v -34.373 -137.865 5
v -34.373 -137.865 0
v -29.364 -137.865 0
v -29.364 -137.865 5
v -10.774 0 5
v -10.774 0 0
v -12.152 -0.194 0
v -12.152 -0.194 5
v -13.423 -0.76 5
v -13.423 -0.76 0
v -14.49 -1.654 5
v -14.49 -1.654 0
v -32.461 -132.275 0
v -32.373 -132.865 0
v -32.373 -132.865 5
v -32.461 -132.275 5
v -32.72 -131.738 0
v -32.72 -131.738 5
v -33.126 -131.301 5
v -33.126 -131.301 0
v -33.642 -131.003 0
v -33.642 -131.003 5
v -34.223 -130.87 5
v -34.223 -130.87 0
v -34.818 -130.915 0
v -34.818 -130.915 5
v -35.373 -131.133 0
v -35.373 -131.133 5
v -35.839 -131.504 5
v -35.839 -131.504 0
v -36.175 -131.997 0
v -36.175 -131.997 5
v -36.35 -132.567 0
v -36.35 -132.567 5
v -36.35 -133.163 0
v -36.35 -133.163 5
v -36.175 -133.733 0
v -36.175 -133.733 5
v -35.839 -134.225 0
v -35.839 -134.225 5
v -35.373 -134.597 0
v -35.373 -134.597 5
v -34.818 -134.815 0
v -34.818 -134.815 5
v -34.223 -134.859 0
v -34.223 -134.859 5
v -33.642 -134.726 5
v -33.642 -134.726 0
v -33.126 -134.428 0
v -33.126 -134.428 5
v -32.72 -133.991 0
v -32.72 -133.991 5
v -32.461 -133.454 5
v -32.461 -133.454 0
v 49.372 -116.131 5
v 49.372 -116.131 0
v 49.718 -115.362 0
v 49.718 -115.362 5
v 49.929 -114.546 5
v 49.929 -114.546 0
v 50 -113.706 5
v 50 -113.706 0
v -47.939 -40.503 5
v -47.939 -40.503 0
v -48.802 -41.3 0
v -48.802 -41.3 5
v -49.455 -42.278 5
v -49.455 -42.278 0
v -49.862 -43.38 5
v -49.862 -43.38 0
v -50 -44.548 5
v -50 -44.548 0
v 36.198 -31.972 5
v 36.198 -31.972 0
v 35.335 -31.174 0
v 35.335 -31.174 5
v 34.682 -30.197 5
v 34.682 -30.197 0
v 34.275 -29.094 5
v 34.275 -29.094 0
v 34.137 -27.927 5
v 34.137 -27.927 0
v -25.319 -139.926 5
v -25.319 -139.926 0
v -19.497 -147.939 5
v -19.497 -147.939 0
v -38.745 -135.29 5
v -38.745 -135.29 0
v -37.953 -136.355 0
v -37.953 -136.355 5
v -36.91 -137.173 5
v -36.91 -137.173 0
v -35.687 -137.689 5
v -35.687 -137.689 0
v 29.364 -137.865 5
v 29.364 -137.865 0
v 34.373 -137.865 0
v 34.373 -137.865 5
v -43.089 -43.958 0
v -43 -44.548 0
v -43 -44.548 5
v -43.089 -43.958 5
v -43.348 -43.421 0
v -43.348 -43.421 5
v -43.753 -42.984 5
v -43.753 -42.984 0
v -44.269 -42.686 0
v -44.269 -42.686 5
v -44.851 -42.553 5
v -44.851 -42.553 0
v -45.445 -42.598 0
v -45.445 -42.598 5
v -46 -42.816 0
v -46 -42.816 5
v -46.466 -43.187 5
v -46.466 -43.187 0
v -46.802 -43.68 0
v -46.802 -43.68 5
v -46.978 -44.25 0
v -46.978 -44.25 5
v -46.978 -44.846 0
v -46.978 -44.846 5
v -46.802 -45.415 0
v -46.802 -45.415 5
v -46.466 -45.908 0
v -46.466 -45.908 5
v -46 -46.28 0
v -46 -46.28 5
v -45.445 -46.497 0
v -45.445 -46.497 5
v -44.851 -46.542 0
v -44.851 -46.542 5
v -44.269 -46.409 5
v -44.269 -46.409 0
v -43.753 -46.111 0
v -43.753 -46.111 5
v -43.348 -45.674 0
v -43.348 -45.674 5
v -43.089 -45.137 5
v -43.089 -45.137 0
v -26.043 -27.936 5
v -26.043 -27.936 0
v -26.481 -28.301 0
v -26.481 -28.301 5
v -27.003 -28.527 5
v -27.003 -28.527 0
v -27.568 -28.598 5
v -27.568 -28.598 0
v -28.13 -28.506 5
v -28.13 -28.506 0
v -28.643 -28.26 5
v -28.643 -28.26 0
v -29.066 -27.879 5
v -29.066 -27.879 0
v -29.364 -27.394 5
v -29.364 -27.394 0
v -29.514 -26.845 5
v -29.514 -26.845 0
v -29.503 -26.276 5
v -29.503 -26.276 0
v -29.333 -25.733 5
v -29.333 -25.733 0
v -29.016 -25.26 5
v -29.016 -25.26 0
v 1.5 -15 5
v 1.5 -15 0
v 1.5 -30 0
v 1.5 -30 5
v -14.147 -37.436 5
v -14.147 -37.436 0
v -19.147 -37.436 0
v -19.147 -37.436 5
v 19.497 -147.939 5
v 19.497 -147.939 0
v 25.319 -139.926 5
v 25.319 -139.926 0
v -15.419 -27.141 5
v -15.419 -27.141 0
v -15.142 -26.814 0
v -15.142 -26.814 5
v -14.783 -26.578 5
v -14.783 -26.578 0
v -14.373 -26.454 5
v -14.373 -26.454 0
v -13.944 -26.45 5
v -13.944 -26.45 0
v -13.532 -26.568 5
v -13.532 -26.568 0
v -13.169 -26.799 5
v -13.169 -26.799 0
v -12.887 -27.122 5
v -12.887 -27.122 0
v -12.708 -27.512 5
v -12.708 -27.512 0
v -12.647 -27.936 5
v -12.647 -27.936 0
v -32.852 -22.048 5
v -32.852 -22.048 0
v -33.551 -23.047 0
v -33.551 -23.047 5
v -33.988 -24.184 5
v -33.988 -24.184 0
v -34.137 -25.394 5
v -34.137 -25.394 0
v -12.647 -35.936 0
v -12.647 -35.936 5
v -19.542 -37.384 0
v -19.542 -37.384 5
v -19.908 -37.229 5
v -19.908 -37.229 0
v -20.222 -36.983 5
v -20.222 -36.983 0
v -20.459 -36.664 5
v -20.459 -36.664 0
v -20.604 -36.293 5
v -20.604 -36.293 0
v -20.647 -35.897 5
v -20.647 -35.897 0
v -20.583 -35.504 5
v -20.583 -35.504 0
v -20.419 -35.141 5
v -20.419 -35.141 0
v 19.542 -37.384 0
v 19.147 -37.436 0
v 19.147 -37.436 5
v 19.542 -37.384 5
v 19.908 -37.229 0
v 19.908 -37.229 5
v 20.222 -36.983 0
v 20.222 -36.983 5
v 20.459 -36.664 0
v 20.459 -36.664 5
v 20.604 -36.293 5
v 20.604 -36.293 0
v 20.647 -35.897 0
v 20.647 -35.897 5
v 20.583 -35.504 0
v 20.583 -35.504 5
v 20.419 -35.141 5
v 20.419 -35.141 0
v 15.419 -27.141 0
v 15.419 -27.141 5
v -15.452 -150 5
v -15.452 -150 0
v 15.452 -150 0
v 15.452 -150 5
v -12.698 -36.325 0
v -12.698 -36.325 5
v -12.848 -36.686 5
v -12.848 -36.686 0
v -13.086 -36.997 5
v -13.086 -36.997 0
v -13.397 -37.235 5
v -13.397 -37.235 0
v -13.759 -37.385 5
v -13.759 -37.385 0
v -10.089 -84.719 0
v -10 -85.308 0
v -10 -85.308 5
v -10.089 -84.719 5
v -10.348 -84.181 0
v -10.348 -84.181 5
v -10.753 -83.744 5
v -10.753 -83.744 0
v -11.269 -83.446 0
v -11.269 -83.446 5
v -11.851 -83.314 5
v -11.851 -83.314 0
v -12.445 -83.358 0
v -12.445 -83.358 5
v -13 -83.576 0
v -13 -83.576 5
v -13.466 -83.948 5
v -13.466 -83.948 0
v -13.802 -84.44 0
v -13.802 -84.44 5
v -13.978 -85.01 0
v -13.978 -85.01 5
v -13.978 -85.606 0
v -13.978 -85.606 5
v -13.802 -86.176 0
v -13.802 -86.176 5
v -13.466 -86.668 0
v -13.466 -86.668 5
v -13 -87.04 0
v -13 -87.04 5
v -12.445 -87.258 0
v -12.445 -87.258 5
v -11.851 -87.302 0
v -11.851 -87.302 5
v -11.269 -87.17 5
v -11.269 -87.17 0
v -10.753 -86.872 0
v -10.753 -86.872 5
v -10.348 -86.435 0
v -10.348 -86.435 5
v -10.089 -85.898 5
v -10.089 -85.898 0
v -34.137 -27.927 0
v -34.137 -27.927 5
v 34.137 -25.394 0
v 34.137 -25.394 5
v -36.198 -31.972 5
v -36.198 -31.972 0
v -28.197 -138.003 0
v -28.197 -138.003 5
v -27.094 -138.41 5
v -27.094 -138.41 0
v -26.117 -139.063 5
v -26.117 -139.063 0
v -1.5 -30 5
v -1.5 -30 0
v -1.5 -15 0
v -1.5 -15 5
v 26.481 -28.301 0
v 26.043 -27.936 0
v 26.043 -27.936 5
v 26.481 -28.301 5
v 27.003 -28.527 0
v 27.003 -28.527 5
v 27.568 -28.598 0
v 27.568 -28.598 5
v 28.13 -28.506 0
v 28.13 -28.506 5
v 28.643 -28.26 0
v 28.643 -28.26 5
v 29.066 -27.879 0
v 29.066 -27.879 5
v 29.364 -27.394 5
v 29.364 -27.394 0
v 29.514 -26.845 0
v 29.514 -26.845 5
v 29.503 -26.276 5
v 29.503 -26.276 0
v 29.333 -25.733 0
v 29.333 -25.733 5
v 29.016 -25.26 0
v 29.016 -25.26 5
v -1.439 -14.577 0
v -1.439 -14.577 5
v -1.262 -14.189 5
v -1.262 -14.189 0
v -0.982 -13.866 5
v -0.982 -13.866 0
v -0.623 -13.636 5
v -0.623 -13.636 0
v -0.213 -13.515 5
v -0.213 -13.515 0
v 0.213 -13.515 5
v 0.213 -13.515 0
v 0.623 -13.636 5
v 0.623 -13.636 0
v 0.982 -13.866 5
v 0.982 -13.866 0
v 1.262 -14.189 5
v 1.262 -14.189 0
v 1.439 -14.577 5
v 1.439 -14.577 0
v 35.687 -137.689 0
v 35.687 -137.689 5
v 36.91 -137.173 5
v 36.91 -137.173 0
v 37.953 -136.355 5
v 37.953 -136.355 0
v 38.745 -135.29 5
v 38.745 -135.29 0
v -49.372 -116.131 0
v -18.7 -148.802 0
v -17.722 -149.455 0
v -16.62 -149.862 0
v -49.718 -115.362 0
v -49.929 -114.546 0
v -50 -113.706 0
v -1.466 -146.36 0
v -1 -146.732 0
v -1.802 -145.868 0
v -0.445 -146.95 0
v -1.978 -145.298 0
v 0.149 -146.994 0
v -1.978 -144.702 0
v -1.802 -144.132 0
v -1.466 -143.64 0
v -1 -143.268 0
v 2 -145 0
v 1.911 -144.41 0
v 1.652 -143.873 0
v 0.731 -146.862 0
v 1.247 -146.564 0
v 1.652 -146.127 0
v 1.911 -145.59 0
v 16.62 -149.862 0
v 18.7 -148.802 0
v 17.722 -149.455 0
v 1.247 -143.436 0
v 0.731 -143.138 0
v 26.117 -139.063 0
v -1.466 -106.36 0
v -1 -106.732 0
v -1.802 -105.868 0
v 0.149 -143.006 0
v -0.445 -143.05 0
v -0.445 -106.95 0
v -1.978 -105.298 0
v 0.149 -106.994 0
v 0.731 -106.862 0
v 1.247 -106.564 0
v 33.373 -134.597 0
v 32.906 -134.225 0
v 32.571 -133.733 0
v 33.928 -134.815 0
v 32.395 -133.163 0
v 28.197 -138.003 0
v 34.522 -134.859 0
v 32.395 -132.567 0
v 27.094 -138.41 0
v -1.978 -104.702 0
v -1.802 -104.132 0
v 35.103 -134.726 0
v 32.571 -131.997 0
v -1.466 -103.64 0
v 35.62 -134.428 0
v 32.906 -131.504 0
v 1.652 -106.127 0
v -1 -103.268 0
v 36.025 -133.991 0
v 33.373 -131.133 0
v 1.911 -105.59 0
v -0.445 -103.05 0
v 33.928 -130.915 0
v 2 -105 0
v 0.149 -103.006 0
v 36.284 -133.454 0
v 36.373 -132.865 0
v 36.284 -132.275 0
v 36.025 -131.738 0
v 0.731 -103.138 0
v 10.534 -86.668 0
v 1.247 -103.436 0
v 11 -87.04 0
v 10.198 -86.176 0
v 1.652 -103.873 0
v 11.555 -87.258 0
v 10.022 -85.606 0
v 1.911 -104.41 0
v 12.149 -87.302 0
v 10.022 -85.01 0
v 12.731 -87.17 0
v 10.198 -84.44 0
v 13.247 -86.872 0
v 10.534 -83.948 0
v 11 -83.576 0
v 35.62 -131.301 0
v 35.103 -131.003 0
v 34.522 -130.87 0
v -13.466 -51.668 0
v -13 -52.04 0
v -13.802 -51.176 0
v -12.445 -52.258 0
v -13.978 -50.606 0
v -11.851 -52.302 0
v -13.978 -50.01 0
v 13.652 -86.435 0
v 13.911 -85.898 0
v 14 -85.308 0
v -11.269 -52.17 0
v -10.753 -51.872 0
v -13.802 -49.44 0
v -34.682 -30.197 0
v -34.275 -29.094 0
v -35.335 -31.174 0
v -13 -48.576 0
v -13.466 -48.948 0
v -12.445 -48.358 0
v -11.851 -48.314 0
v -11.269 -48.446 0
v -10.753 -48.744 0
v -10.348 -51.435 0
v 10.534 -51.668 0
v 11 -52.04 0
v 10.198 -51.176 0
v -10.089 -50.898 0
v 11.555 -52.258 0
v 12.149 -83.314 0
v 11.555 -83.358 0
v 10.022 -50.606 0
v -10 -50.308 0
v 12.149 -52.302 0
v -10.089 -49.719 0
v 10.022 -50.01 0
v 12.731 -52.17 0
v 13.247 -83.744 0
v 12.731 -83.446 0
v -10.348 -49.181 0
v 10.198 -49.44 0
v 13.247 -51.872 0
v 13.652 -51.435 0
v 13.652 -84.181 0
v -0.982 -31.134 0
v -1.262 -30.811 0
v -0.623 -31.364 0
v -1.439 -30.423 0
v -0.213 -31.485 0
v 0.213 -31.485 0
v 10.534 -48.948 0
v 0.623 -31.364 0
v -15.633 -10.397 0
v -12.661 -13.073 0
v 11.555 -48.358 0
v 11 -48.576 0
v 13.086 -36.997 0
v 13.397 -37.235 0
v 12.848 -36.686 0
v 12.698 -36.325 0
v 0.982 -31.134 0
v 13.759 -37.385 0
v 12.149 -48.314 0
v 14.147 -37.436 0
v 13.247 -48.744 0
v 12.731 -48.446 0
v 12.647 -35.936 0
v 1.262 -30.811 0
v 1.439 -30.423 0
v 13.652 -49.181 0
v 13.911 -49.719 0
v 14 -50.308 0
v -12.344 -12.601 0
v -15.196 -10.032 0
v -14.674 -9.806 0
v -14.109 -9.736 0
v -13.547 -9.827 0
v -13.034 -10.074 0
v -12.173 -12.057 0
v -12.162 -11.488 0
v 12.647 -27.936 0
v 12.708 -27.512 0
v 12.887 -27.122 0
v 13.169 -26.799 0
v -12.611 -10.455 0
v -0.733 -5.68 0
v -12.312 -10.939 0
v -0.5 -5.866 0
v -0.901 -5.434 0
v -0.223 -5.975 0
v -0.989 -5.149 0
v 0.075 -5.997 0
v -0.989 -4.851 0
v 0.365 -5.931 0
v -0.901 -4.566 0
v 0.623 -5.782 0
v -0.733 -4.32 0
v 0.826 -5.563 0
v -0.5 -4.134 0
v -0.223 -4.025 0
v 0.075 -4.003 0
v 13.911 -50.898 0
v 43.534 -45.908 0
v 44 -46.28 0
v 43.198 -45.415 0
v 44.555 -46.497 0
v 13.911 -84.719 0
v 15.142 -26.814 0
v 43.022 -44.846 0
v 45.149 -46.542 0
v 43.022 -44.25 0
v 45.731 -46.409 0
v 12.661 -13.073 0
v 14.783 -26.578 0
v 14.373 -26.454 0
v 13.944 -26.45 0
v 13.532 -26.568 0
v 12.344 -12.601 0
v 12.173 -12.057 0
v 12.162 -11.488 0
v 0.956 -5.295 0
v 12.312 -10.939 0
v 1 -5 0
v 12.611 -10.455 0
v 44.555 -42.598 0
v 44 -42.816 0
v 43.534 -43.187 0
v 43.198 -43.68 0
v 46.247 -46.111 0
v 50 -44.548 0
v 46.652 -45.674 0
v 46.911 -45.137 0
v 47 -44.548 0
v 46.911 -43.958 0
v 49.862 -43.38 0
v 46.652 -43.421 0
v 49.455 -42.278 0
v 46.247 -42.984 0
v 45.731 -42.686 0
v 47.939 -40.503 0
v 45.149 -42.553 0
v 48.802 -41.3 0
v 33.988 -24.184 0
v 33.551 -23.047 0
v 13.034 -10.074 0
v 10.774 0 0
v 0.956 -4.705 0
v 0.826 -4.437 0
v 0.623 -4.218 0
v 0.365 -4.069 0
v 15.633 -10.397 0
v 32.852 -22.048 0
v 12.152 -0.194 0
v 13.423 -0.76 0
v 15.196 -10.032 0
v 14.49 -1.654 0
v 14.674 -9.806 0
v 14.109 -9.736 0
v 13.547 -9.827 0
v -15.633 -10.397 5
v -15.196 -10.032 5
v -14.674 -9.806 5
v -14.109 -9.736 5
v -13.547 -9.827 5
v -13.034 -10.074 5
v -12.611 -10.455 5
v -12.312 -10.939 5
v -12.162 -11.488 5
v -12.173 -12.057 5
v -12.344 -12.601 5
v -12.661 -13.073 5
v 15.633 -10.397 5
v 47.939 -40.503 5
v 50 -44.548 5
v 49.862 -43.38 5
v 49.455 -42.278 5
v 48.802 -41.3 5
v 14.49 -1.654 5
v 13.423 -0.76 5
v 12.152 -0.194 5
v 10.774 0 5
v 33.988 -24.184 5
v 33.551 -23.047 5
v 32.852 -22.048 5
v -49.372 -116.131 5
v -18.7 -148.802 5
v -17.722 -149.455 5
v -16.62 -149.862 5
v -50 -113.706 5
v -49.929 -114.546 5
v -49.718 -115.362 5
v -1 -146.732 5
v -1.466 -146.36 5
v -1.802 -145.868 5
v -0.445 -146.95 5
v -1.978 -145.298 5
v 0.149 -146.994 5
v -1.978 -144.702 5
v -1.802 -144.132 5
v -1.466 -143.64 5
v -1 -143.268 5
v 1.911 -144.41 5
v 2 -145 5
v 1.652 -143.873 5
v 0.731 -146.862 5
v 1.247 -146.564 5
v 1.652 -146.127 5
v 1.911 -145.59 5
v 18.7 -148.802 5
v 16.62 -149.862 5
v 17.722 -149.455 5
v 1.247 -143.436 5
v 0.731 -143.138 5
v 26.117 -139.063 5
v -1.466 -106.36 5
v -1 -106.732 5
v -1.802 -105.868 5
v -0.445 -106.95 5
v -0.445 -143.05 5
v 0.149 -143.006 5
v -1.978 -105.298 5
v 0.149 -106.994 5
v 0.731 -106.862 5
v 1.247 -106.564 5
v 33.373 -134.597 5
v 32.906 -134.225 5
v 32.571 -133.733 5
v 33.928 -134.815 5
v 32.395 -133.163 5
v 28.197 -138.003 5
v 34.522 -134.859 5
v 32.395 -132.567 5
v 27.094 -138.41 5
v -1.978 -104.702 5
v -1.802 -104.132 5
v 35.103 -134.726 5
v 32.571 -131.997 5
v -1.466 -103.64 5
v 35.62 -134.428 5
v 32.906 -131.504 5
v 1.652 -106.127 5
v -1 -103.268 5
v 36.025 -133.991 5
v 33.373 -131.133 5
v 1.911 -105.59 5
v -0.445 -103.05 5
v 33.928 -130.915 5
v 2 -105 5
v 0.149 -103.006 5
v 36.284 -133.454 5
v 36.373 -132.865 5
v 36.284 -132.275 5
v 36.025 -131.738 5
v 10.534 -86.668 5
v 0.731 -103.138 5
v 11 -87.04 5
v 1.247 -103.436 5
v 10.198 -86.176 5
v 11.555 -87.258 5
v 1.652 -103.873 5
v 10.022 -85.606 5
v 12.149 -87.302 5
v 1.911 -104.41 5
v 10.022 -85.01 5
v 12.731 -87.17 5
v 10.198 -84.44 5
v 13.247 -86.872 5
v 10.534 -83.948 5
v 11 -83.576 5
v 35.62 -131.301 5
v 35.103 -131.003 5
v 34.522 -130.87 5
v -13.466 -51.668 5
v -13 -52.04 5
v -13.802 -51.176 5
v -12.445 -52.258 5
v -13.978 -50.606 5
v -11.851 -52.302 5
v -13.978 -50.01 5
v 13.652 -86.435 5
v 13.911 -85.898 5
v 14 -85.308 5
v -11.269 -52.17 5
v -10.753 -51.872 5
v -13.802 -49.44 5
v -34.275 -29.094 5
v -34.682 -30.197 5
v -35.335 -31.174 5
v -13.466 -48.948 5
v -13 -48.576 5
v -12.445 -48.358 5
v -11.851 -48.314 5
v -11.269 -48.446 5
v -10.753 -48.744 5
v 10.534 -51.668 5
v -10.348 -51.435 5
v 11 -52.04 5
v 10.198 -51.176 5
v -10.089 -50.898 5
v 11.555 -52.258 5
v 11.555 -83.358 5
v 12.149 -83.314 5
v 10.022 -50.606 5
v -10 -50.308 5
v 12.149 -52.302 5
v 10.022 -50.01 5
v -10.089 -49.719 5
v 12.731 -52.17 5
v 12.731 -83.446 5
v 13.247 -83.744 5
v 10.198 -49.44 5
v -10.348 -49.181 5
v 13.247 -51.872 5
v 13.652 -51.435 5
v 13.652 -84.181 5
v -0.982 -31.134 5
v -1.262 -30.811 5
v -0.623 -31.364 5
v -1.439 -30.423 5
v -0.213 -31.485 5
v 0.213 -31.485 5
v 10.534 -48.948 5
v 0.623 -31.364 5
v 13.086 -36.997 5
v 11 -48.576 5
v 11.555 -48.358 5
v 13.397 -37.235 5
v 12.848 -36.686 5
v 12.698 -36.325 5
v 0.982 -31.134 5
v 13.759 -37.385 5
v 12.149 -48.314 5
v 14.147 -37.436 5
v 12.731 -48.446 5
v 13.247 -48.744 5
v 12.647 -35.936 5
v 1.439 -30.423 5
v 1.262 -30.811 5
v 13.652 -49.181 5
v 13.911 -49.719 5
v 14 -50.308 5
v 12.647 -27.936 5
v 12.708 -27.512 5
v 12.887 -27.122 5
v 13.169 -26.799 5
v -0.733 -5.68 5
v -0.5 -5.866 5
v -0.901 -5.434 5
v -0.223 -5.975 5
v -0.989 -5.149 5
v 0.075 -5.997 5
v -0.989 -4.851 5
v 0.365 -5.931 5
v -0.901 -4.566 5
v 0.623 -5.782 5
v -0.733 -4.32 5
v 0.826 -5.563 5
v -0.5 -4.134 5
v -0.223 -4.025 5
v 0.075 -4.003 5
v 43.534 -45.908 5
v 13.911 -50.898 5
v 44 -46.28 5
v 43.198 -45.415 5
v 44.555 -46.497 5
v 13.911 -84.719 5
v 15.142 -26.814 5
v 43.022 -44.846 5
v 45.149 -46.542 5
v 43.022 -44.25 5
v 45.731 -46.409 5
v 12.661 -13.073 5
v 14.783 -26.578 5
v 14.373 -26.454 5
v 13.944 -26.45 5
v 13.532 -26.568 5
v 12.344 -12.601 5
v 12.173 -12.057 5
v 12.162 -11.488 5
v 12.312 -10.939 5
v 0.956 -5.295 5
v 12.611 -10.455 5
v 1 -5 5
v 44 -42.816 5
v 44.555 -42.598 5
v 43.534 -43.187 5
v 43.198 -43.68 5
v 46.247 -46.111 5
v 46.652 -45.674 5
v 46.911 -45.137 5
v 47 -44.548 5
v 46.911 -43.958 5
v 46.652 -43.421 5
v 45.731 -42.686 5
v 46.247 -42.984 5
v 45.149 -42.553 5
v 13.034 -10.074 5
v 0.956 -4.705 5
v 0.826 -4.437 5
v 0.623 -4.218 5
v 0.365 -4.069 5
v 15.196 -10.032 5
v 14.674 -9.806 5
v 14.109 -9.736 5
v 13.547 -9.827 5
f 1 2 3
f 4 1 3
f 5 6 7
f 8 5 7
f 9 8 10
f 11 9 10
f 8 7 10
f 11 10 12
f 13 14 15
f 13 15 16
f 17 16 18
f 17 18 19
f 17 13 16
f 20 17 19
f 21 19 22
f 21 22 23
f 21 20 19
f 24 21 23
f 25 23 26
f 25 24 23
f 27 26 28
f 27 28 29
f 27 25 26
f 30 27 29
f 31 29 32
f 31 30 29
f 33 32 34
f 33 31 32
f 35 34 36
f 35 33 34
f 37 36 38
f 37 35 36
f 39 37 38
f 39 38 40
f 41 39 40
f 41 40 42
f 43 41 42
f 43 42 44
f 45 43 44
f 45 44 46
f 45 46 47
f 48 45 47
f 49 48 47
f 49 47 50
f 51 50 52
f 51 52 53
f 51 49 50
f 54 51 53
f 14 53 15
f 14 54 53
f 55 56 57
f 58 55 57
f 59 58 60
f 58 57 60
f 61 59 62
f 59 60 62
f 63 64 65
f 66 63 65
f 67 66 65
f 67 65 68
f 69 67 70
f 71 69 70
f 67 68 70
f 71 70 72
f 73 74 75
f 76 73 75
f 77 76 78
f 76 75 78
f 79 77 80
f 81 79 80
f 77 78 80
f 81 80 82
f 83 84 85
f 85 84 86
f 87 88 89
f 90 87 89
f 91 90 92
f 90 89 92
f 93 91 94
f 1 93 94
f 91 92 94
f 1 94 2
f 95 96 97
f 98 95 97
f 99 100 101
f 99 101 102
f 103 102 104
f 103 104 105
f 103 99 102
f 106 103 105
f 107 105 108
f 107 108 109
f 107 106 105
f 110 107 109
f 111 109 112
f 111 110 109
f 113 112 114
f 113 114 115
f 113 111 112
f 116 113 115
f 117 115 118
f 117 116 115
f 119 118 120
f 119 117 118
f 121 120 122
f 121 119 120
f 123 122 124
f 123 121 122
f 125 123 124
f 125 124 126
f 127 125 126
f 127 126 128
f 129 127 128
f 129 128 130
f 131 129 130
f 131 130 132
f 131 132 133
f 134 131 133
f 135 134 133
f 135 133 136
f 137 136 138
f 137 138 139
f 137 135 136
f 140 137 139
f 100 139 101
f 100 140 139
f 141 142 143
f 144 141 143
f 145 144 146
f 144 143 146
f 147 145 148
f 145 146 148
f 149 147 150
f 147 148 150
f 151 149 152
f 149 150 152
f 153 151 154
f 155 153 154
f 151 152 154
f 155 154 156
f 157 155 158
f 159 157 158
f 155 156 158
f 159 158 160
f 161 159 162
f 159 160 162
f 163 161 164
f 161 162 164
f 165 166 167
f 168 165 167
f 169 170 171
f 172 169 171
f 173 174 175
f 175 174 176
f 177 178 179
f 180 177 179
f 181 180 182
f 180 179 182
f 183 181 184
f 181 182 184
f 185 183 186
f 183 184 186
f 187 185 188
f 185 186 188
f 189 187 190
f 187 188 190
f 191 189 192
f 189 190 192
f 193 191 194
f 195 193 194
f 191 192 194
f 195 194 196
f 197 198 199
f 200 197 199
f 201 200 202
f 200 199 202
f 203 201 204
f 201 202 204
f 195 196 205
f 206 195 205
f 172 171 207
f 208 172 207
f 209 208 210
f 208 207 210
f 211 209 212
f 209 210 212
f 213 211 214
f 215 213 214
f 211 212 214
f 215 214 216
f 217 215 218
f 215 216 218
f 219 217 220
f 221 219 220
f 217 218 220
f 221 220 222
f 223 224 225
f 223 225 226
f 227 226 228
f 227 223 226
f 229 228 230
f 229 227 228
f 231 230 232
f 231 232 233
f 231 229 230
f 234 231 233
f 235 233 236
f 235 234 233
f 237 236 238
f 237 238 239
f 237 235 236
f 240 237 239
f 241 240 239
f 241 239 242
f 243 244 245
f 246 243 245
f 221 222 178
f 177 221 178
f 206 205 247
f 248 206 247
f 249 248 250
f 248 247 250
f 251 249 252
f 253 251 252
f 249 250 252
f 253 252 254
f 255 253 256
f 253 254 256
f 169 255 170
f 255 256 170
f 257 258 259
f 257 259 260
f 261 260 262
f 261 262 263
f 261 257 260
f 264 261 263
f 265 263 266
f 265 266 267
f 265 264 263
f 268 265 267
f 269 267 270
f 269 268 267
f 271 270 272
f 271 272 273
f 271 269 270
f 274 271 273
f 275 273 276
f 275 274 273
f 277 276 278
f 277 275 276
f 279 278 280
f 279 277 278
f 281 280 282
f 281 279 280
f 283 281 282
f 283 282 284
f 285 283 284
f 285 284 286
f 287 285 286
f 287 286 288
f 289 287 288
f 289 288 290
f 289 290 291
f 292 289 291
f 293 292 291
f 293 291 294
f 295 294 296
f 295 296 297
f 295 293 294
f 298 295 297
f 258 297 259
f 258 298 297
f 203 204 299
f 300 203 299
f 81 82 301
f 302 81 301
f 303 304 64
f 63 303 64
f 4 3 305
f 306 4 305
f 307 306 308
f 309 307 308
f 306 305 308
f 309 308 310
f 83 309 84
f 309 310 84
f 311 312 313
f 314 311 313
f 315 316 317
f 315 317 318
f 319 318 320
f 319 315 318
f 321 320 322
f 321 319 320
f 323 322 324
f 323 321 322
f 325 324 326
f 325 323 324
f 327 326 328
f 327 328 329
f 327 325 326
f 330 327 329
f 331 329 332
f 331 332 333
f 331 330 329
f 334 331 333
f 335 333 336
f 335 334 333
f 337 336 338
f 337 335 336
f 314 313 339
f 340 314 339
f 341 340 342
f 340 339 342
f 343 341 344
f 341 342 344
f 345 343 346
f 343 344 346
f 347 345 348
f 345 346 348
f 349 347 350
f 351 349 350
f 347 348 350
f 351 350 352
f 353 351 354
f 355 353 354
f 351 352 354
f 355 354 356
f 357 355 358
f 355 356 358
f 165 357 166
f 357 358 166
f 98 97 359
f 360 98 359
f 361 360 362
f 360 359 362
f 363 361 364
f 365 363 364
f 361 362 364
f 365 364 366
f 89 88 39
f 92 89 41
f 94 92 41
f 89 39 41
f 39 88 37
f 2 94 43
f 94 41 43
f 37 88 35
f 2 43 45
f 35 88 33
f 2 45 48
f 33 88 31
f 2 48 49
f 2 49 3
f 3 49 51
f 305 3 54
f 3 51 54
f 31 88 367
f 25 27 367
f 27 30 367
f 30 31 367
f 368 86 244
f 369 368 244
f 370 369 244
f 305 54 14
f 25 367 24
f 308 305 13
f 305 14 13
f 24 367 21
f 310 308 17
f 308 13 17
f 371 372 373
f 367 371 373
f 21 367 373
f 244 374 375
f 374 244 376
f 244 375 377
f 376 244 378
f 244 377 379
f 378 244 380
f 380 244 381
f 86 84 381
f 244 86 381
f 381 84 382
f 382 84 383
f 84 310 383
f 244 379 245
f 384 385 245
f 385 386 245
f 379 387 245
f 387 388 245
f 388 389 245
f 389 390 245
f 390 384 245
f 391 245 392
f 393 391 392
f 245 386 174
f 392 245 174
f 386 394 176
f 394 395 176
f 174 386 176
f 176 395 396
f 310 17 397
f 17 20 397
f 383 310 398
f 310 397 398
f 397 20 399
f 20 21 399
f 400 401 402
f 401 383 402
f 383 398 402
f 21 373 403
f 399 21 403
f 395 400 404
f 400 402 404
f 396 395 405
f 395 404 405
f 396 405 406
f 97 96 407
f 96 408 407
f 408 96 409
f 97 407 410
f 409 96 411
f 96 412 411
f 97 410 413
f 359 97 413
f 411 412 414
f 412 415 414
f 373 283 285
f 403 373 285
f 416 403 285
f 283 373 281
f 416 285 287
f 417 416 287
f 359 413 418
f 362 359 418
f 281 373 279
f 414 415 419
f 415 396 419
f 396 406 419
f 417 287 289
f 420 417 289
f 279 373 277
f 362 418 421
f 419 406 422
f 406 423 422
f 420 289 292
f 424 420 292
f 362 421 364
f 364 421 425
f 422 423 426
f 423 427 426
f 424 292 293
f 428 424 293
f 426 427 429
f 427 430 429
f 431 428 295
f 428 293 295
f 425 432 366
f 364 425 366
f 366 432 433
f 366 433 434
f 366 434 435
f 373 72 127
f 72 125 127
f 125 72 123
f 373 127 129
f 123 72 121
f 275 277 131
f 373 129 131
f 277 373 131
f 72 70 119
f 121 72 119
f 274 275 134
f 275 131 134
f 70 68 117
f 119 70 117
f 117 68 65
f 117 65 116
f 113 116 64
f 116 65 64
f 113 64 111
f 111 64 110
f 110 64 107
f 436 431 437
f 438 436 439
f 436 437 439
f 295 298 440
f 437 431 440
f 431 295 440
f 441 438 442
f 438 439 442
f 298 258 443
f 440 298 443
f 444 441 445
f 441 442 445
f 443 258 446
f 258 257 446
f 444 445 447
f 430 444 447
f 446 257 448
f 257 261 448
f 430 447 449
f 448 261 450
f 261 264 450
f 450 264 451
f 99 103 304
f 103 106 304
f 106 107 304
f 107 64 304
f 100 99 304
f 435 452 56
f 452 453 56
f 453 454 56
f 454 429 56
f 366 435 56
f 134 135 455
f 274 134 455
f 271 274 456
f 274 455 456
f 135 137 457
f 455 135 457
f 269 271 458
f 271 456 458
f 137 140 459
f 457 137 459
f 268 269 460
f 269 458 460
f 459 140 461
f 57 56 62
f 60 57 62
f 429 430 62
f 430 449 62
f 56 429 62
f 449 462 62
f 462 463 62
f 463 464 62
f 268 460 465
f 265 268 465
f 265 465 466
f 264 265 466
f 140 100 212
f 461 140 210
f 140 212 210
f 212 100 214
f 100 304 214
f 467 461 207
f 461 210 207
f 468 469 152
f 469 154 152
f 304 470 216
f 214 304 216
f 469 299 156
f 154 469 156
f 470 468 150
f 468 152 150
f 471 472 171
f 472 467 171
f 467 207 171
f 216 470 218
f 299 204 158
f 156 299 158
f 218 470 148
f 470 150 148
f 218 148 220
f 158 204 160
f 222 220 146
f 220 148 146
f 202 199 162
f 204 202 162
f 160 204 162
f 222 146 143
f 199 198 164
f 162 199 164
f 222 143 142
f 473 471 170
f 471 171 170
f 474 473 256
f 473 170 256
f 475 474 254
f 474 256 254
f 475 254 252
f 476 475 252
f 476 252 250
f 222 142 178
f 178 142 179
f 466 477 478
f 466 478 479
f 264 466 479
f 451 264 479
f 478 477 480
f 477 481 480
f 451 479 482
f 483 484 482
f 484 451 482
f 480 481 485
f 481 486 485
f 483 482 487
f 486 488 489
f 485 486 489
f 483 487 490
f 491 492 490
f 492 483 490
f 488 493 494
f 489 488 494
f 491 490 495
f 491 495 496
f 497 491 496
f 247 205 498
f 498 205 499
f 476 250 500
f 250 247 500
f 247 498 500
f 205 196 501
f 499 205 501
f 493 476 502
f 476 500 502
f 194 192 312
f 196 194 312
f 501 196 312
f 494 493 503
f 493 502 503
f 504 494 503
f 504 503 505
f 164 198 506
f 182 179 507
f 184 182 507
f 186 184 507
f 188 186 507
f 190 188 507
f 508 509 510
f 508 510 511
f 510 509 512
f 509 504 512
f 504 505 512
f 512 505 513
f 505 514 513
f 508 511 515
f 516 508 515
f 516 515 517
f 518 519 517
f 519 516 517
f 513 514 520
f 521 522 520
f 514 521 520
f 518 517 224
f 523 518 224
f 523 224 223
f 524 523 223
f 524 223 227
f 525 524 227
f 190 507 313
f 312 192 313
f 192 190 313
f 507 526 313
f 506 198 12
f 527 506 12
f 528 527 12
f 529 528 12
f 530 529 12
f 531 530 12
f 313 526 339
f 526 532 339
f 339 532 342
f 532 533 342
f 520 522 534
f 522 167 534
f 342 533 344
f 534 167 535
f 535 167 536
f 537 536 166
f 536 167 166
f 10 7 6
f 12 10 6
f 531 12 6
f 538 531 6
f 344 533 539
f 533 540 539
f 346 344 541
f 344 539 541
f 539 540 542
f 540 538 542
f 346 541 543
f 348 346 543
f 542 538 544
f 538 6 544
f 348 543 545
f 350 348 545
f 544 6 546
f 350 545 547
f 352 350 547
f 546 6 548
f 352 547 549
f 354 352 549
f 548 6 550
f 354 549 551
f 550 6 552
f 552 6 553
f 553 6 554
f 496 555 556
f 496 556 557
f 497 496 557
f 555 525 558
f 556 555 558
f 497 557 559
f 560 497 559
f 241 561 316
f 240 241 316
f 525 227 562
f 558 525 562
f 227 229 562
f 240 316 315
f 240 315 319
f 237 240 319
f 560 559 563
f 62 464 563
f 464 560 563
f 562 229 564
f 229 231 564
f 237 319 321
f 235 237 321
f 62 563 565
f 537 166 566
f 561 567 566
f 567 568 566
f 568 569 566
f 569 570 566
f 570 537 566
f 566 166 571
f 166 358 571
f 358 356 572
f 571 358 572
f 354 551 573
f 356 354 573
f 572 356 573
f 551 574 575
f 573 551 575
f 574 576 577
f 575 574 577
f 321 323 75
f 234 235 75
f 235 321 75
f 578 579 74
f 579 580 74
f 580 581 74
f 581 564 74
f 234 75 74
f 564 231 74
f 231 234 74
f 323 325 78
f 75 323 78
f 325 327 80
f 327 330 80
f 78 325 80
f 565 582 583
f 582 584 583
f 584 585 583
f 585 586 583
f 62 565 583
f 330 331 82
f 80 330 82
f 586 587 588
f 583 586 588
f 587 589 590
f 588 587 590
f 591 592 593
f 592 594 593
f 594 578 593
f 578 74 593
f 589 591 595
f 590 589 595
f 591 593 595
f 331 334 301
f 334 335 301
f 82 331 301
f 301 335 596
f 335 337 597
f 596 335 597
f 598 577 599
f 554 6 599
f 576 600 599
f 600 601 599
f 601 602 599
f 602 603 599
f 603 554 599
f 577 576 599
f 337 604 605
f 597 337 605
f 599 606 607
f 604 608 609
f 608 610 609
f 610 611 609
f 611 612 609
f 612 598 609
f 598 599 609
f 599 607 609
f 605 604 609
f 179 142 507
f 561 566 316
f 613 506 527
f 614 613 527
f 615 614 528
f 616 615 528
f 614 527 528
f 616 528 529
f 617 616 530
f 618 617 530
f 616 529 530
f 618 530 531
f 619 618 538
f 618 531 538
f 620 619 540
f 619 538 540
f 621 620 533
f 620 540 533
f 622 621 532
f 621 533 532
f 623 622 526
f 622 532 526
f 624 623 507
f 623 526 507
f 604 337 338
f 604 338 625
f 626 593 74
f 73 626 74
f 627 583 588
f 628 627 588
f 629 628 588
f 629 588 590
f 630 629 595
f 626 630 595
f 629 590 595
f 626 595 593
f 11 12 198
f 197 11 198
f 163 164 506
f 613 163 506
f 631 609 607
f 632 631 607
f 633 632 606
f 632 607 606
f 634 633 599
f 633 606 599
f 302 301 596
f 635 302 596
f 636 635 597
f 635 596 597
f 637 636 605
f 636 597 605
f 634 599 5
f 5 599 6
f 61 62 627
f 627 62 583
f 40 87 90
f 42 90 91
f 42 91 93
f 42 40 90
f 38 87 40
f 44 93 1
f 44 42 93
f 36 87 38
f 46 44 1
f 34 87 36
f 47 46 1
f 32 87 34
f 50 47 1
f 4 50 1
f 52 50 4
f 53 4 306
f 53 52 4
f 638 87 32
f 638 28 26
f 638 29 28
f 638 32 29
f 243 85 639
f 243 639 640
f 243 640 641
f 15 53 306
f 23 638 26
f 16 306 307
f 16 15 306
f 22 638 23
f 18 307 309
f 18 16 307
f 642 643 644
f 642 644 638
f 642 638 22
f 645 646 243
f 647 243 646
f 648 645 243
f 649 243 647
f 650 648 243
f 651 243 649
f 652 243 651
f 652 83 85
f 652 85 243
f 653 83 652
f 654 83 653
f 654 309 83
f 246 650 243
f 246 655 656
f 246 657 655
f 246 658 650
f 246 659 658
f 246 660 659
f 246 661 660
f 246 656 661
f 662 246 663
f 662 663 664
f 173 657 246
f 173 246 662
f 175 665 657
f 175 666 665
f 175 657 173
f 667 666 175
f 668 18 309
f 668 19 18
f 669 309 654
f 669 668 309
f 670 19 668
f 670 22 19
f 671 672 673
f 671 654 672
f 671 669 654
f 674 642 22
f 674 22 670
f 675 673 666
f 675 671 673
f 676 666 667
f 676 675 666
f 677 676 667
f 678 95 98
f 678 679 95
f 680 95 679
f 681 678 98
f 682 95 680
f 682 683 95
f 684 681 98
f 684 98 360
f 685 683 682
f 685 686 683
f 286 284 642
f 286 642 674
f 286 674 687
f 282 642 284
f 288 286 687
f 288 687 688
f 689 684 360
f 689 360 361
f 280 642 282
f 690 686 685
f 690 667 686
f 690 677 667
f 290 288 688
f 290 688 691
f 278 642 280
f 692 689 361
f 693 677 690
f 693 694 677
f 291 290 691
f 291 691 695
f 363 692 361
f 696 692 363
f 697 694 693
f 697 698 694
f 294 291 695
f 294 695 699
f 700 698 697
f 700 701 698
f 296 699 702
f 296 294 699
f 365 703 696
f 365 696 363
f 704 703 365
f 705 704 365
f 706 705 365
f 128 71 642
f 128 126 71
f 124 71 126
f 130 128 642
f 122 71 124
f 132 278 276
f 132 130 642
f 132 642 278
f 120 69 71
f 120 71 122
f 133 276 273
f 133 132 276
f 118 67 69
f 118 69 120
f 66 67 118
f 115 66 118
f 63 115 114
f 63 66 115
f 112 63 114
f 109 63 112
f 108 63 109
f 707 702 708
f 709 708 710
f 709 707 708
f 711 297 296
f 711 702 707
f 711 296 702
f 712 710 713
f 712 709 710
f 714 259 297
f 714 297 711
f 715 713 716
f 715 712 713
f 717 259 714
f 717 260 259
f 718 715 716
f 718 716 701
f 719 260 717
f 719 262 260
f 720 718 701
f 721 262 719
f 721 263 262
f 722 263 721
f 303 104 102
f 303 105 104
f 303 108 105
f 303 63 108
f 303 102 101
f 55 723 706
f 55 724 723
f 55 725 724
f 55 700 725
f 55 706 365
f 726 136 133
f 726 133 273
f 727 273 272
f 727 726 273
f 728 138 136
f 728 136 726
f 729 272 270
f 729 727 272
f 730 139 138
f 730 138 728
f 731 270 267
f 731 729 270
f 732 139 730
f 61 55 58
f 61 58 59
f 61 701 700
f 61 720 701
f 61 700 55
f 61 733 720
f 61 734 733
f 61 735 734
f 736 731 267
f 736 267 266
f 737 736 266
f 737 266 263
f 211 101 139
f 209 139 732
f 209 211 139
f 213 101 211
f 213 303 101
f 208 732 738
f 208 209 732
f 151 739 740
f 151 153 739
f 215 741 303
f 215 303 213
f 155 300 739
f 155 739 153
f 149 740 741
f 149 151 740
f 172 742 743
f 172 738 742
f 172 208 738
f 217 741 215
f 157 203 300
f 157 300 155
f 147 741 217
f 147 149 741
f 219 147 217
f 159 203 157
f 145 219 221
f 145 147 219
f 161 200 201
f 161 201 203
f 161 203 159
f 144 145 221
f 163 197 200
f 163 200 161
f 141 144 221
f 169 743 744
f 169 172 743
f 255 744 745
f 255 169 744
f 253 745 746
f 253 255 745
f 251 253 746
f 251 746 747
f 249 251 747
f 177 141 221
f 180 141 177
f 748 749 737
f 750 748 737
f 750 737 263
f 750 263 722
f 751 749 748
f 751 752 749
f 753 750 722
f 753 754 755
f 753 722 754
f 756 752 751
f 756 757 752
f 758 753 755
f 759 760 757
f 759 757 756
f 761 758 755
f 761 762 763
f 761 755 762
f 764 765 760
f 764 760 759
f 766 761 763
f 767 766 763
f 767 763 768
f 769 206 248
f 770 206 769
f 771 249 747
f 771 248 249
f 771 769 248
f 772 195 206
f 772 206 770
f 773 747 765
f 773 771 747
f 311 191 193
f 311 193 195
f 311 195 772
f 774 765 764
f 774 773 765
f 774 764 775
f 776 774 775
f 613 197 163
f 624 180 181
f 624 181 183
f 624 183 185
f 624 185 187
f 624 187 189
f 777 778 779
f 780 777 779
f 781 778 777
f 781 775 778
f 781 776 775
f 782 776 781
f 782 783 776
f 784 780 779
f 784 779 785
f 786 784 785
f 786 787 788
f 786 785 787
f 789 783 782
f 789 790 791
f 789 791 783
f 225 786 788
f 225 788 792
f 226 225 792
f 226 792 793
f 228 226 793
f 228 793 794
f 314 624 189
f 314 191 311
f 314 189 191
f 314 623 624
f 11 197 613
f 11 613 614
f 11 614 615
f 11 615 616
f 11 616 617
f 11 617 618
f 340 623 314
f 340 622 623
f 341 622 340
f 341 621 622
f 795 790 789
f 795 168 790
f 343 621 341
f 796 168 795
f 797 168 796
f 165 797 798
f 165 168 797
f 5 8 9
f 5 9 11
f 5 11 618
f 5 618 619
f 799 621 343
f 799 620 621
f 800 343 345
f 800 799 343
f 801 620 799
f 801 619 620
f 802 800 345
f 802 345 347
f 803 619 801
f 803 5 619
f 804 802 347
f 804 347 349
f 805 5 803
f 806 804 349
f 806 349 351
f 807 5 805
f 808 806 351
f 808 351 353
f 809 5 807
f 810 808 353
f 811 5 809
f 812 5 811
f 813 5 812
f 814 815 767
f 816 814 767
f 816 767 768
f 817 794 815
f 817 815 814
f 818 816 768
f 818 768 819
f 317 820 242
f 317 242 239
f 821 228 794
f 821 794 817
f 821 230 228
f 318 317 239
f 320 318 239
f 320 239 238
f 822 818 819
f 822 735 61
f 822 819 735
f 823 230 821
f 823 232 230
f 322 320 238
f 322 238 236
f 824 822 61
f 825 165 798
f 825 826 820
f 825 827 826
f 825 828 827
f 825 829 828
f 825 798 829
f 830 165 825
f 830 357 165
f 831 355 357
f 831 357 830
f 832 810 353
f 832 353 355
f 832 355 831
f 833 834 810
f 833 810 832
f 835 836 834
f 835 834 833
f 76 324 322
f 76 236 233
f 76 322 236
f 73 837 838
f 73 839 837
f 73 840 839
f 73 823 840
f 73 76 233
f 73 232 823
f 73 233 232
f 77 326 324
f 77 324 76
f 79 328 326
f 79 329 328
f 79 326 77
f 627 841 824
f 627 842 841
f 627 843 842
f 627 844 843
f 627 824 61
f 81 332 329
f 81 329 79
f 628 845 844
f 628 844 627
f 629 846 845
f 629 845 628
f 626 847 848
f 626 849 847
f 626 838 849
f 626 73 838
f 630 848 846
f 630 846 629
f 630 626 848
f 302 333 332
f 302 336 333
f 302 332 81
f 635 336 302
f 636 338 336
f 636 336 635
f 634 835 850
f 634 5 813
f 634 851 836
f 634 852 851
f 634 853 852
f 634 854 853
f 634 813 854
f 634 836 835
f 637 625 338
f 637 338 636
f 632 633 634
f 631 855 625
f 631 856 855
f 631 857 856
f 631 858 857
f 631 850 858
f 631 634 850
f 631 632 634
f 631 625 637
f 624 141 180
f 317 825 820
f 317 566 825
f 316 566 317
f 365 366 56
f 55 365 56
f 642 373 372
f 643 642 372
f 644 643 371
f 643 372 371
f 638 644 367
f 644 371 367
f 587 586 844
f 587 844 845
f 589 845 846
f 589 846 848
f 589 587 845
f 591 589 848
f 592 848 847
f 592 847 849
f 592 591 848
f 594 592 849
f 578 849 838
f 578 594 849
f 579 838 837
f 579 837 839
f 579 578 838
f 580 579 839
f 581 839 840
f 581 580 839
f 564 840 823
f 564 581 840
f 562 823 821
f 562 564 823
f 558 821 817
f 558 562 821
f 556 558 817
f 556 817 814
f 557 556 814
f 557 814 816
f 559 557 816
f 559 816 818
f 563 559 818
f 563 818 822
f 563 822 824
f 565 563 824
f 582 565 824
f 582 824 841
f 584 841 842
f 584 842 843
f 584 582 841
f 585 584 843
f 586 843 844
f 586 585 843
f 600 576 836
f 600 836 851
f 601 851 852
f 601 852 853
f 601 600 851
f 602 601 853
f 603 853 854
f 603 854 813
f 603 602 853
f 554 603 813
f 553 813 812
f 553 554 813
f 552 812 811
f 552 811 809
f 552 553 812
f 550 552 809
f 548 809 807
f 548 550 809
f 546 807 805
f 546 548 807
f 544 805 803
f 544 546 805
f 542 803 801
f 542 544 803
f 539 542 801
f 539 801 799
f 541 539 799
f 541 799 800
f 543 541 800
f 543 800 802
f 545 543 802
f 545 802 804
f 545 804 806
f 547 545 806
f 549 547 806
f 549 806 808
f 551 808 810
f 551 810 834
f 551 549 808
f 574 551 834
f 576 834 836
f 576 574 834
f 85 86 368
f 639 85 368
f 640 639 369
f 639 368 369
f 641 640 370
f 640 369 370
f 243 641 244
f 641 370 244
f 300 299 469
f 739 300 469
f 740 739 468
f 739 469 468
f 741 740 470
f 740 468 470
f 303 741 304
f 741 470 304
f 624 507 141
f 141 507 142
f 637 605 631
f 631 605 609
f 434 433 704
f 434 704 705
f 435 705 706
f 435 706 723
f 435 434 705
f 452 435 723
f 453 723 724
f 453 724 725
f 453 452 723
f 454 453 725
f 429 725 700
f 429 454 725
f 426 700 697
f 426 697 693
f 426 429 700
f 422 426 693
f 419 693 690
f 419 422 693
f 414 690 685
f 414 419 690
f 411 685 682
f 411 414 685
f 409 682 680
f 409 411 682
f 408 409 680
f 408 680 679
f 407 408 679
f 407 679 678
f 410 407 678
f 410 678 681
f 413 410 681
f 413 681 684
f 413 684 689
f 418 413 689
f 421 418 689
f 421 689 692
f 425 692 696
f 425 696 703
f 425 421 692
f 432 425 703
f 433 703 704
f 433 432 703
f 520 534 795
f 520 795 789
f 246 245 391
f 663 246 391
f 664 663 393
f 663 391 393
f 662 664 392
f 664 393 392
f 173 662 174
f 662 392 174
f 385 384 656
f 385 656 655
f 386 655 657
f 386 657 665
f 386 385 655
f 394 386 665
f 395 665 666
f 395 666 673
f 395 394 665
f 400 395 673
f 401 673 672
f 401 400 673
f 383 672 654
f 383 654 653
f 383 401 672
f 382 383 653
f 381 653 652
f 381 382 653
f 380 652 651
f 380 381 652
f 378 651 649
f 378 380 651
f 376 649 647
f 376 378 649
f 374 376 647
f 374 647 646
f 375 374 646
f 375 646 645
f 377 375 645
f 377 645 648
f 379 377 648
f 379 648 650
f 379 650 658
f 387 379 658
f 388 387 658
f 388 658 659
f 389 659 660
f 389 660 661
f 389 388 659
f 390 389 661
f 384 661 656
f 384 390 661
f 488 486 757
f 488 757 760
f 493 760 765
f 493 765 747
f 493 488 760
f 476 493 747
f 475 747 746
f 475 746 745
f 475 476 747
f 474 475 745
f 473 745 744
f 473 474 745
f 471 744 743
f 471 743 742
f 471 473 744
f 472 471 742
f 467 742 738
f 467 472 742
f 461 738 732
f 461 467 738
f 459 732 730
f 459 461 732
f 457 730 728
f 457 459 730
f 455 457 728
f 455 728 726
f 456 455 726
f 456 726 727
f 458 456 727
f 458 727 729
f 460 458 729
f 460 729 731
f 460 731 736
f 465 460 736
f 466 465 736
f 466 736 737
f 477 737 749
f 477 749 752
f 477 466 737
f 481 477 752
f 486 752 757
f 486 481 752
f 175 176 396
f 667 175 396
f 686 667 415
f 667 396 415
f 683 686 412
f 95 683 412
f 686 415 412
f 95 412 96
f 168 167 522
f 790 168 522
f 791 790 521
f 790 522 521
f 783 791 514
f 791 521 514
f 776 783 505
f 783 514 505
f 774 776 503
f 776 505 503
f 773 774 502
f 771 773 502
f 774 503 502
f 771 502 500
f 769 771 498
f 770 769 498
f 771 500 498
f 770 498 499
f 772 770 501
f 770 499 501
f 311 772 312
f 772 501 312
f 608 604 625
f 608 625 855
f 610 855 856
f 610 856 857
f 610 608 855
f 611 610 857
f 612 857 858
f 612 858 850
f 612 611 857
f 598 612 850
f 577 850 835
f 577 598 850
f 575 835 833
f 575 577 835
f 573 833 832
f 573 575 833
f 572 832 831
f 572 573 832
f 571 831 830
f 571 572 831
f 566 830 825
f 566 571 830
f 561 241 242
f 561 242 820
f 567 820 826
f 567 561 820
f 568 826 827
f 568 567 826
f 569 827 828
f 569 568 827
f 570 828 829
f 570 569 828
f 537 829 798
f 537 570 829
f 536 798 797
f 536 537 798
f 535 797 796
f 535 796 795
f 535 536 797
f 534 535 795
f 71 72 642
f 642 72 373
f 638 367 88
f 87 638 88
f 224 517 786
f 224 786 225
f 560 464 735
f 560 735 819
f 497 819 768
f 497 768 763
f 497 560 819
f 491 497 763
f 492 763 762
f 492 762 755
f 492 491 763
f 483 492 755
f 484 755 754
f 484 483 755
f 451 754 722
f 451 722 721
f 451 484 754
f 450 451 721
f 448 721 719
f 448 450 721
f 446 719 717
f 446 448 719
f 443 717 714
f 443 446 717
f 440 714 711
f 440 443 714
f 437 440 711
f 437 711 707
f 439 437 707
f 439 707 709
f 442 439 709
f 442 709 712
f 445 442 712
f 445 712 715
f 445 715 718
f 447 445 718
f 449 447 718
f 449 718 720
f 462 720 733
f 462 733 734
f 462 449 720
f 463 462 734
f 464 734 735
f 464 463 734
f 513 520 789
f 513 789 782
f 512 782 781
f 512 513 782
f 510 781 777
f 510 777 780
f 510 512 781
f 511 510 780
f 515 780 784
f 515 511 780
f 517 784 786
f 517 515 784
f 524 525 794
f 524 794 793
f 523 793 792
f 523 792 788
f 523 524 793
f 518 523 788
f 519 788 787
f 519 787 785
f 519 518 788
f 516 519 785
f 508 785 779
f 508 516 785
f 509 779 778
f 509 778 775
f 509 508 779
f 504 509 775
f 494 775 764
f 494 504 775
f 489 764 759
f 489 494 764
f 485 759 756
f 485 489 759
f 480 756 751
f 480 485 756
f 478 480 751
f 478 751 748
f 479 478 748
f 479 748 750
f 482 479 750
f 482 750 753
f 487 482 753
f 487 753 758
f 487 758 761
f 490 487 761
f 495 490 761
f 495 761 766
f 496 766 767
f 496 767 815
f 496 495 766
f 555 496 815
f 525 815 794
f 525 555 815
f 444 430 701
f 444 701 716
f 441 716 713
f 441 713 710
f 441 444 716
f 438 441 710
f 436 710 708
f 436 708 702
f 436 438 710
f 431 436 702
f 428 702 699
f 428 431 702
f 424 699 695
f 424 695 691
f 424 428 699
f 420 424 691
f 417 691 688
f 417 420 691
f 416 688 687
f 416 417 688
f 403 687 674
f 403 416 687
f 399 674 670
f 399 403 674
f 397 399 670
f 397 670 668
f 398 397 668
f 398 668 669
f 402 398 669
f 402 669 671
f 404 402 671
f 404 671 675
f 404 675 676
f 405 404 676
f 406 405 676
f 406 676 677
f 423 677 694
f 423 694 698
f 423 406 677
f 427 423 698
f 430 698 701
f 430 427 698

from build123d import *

# Parameters (mm, degrees)
SKETCH2_R           = 1
SKETCH2_R_2         = 2
BOSS_EXTRUDE1_DEPTH = 5


with BuildPart() as part:
    # Sketch2 → Boss-Extrude1 (new body)
    with BuildSketch(Plane.XY):
        with BuildLine():
            Line((10.773856573, 0), (-10.773856573, 0))
            ThreePointArc((-10.773856573, 0), (-12.807539789, -0.432272712), (-14.489580701, -1.654346968))
            Line((-14.489580701, -1.654346968), (-32.85230533, -22.048218747))
            ThreePointArc((-32.85230533, -22.048218747), (-33.804483335, -23.602032031), (-34.136581202, -25.393871779))
            Line((-34.136581202, -25.393871779), (-34.136581202, -27.926924356))
            ThreePointArc((-34.136581202, -27.926924356), (-34.681548581, -30.196876855), (-36.197654941, -31.972009328))
            Line((-36.197654941, -31.972009328), (-47.938926261, -40.502542276))
            ThreePointArc((-47.938926261, -40.502542276), (-49.455032621, -42.277674749), (-50, -44.547627247))
            Line((-50, -44.547627247), (-50, -113.7061014))
            ThreePointArc((-50, -113.7061014), (-49.840547901, -114.95873703), (-49.372361591, -116.131478508))
            Line((-49.372361591, -116.131478508), (-38.744938669, -135.290122192))
            ThreePointArc((-38.744938669, -135.290122192), (-36.909614174, -137.173276478), (-34.372577077, -137.864745084))
            Line((-34.372577077, -137.864745084), (-29.364406032, -137.864745084))
            ThreePointArc((-29.364406032, -137.864745084), (-27.094453533, -138.409712463), (-25.31932106, -139.925818823))
            Line((-25.31932106, -139.925818823), (-19.497457724, -147.938926261))
            ThreePointArc((-19.497457724, -147.938926261), (-17.722325251, -149.455032621), (-15.452372753, -150))
            Line((-15.452372753, -150), (15.452372753, -150))
            ThreePointArc((15.452372753, -150), (17.722325251, -149.455032621), (19.497457724, -147.938926261))
            Line((19.497457724, -147.938926261), (25.31932106, -139.925818823))
            ThreePointArc((25.31932106, -139.925818823), (27.094453533, -138.409712463), (29.364406032, -137.864745084))
            Line((29.364406032, -137.864745084), (34.372577077, -137.864745084))
            ThreePointArc((34.372577077, -137.864745084), (36.909614174, -137.173276478), (38.744938669, -135.290122192))
            Line((38.744938669, -135.290122192), (49.372361591, -116.131478508))
            ThreePointArc((49.372361591, -116.131478508), (49.840547901, -114.95873703), (50, -113.7061014))
            Line((50, -113.7061014), (50, -44.547627247))
            ThreePointArc((50, -44.547627247), (49.455032621, -42.277674749), (47.938926261, -40.502542276))
            Line((47.938926261, -40.502542276), (36.197654941, -31.972009328))
            ThreePointArc((36.197654941, -31.972009328), (34.681548581, -30.196876855), (34.136581202, -27.926924356))
            Line((34.136581202, -27.926924356), (34.136581202, -25.393871779))
            ThreePointArc((34.136581202, -25.393871779), (33.804483335, -23.602032031), (32.85230533, -22.048218747))
            Line((32.85230533, -22.048218747), (14.489580701, -1.654346968))
            ThreePointArc((14.489580701, -1.654346968), (12.807539789, -0.432272712), (10.773856573, 0))
        make_face()
        with Locations((0, -5)):
            Circle(SKETCH2_R, mode=Mode.SUBTRACT)
        with Locations((0, -145)):
            Circle(SKETCH2_R_2, mode=Mode.SUBTRACT)
        with Locations((0, -105)):
            Circle(SKETCH2_R_2, mode=Mode.SUBTRACT)
        with Locations((-12, -50.308044585)):
            Circle(SKETCH2_R_2, mode=Mode.SUBTRACT)
        with Locations((12, -50.308044585)):
            Circle(SKETCH2_R_2, mode=Mode.SUBTRACT)
        with Locations((12, -85.308044585)):
            Circle(SKETCH2_R_2, mode=Mode.SUBTRACT)
        with Locations((-12, -85.308044585)):
            Circle(SKETCH2_R_2, mode=Mode.SUBTRACT)
        with Locations((-34.372577077, -132.864745084)):
            Circle(SKETCH2_R_2, mode=Mode.SUBTRACT)
        with Locations((34.372577077, -132.864745084)):
            Circle(SKETCH2_R_2, mode=Mode.SUBTRACT)
        with Locations((-45, -44.547627247)):
            Circle(SKETCH2_R_2, mode=Mode.SUBTRACT)
        with Locations((45, -44.547627247)):
            Circle(SKETCH2_R_2, mode=Mode.SUBTRACT)
        with BuildLine():
            Line((-12.660728973, -13.073490301), (-26.043341101, -27.93638681))
            ThreePointArc((-26.043341101, -27.93638681), (-28.867891964, -28.084415248), (-29.015920402, -25.259864385))
            Line((-29.015920402, -25.259864385), (-15.633308275, -10.396967875))
            ThreePointArc((-15.633308275, -10.396967875), (-12.808757412, -10.248939437), (-12.660728973, -13.073490301))
        make_face(mode=Mode.SUBTRACT)
        with BuildLine():
            Line((14.147018624, -37.43638681), (19.147018624, -37.43638681))
            ThreePointArc((19.147018624, -37.43638681), (20.458982346, -36.663539609), (20.41901608, -35.1413884))
            Line((20.41901608, -35.1413884), (15.41901608, -27.1413884))
            ThreePointArc((15.41901608, -27.1413884), (13.733494855, -26.494513691), (12.647018624, -27.93638681))
            Line((12.647018624, -27.93638681), (12.647018624, -35.93638681))
            ThreePointArc((12.647018624, -35.93638681), (13.086358453, -36.997046982), (14.147018624, -37.43638681))
        make_face(mode=Mode.SUBTRACT)
        with BuildLine():
            Line((-14.147018624, -37.43638681), (-19.147018624, -37.43638681))
            ThreePointArc((-19.147018624, -37.43638681), (-20.458982346, -36.663539609), (-20.41901608, -35.1413884))
            Line((-20.41901608, -35.1413884), (-15.41901608, -27.1413884))
            ThreePointArc((-15.41901608, -27.1413884), (-13.733494855, -26.494513691), (-12.647018624, -27.93638681))
            Line((-12.647018624, -27.93638681), (-12.647018624, -35.93638681))
            ThreePointArc((-12.647018624, -35.93638681), (-13.086358453, -36.997046982), (-14.147018624, -37.43638681))
        make_face(mode=Mode.SUBTRACT)
        with BuildLine():
            Line((12.660728973, -13.073490301), (26.043341101, -27.93638681))
            ThreePointArc((26.043341101, -27.93638681), (28.867891964, -28.084415248), (29.015920402, -25.259864385))
            Line((29.015920402, -25.259864385), (15.633308275, -10.396967875))
            ThreePointArc((15.633308275, -10.396967875), (12.808757412, -10.248939437), (12.660728973, -13.073490301))
        make_face(mode=Mode.SUBTRACT)
        with BuildLine():
            Line((1.5, -15), (1.5, -30))
            ThreePointArc((1.5, -30), (0, -31.5), (-1.5, -30))
            Line((-1.5, -30), (-1.5, -15))
            ThreePointArc((-1.5, -15), (0, -13.5), (1.5, -15))
        make_face(mode=Mode.SUBTRACT)
    extrude(amount=BOSS_EXTRUDE1_DEPTH)


solid = part.part
